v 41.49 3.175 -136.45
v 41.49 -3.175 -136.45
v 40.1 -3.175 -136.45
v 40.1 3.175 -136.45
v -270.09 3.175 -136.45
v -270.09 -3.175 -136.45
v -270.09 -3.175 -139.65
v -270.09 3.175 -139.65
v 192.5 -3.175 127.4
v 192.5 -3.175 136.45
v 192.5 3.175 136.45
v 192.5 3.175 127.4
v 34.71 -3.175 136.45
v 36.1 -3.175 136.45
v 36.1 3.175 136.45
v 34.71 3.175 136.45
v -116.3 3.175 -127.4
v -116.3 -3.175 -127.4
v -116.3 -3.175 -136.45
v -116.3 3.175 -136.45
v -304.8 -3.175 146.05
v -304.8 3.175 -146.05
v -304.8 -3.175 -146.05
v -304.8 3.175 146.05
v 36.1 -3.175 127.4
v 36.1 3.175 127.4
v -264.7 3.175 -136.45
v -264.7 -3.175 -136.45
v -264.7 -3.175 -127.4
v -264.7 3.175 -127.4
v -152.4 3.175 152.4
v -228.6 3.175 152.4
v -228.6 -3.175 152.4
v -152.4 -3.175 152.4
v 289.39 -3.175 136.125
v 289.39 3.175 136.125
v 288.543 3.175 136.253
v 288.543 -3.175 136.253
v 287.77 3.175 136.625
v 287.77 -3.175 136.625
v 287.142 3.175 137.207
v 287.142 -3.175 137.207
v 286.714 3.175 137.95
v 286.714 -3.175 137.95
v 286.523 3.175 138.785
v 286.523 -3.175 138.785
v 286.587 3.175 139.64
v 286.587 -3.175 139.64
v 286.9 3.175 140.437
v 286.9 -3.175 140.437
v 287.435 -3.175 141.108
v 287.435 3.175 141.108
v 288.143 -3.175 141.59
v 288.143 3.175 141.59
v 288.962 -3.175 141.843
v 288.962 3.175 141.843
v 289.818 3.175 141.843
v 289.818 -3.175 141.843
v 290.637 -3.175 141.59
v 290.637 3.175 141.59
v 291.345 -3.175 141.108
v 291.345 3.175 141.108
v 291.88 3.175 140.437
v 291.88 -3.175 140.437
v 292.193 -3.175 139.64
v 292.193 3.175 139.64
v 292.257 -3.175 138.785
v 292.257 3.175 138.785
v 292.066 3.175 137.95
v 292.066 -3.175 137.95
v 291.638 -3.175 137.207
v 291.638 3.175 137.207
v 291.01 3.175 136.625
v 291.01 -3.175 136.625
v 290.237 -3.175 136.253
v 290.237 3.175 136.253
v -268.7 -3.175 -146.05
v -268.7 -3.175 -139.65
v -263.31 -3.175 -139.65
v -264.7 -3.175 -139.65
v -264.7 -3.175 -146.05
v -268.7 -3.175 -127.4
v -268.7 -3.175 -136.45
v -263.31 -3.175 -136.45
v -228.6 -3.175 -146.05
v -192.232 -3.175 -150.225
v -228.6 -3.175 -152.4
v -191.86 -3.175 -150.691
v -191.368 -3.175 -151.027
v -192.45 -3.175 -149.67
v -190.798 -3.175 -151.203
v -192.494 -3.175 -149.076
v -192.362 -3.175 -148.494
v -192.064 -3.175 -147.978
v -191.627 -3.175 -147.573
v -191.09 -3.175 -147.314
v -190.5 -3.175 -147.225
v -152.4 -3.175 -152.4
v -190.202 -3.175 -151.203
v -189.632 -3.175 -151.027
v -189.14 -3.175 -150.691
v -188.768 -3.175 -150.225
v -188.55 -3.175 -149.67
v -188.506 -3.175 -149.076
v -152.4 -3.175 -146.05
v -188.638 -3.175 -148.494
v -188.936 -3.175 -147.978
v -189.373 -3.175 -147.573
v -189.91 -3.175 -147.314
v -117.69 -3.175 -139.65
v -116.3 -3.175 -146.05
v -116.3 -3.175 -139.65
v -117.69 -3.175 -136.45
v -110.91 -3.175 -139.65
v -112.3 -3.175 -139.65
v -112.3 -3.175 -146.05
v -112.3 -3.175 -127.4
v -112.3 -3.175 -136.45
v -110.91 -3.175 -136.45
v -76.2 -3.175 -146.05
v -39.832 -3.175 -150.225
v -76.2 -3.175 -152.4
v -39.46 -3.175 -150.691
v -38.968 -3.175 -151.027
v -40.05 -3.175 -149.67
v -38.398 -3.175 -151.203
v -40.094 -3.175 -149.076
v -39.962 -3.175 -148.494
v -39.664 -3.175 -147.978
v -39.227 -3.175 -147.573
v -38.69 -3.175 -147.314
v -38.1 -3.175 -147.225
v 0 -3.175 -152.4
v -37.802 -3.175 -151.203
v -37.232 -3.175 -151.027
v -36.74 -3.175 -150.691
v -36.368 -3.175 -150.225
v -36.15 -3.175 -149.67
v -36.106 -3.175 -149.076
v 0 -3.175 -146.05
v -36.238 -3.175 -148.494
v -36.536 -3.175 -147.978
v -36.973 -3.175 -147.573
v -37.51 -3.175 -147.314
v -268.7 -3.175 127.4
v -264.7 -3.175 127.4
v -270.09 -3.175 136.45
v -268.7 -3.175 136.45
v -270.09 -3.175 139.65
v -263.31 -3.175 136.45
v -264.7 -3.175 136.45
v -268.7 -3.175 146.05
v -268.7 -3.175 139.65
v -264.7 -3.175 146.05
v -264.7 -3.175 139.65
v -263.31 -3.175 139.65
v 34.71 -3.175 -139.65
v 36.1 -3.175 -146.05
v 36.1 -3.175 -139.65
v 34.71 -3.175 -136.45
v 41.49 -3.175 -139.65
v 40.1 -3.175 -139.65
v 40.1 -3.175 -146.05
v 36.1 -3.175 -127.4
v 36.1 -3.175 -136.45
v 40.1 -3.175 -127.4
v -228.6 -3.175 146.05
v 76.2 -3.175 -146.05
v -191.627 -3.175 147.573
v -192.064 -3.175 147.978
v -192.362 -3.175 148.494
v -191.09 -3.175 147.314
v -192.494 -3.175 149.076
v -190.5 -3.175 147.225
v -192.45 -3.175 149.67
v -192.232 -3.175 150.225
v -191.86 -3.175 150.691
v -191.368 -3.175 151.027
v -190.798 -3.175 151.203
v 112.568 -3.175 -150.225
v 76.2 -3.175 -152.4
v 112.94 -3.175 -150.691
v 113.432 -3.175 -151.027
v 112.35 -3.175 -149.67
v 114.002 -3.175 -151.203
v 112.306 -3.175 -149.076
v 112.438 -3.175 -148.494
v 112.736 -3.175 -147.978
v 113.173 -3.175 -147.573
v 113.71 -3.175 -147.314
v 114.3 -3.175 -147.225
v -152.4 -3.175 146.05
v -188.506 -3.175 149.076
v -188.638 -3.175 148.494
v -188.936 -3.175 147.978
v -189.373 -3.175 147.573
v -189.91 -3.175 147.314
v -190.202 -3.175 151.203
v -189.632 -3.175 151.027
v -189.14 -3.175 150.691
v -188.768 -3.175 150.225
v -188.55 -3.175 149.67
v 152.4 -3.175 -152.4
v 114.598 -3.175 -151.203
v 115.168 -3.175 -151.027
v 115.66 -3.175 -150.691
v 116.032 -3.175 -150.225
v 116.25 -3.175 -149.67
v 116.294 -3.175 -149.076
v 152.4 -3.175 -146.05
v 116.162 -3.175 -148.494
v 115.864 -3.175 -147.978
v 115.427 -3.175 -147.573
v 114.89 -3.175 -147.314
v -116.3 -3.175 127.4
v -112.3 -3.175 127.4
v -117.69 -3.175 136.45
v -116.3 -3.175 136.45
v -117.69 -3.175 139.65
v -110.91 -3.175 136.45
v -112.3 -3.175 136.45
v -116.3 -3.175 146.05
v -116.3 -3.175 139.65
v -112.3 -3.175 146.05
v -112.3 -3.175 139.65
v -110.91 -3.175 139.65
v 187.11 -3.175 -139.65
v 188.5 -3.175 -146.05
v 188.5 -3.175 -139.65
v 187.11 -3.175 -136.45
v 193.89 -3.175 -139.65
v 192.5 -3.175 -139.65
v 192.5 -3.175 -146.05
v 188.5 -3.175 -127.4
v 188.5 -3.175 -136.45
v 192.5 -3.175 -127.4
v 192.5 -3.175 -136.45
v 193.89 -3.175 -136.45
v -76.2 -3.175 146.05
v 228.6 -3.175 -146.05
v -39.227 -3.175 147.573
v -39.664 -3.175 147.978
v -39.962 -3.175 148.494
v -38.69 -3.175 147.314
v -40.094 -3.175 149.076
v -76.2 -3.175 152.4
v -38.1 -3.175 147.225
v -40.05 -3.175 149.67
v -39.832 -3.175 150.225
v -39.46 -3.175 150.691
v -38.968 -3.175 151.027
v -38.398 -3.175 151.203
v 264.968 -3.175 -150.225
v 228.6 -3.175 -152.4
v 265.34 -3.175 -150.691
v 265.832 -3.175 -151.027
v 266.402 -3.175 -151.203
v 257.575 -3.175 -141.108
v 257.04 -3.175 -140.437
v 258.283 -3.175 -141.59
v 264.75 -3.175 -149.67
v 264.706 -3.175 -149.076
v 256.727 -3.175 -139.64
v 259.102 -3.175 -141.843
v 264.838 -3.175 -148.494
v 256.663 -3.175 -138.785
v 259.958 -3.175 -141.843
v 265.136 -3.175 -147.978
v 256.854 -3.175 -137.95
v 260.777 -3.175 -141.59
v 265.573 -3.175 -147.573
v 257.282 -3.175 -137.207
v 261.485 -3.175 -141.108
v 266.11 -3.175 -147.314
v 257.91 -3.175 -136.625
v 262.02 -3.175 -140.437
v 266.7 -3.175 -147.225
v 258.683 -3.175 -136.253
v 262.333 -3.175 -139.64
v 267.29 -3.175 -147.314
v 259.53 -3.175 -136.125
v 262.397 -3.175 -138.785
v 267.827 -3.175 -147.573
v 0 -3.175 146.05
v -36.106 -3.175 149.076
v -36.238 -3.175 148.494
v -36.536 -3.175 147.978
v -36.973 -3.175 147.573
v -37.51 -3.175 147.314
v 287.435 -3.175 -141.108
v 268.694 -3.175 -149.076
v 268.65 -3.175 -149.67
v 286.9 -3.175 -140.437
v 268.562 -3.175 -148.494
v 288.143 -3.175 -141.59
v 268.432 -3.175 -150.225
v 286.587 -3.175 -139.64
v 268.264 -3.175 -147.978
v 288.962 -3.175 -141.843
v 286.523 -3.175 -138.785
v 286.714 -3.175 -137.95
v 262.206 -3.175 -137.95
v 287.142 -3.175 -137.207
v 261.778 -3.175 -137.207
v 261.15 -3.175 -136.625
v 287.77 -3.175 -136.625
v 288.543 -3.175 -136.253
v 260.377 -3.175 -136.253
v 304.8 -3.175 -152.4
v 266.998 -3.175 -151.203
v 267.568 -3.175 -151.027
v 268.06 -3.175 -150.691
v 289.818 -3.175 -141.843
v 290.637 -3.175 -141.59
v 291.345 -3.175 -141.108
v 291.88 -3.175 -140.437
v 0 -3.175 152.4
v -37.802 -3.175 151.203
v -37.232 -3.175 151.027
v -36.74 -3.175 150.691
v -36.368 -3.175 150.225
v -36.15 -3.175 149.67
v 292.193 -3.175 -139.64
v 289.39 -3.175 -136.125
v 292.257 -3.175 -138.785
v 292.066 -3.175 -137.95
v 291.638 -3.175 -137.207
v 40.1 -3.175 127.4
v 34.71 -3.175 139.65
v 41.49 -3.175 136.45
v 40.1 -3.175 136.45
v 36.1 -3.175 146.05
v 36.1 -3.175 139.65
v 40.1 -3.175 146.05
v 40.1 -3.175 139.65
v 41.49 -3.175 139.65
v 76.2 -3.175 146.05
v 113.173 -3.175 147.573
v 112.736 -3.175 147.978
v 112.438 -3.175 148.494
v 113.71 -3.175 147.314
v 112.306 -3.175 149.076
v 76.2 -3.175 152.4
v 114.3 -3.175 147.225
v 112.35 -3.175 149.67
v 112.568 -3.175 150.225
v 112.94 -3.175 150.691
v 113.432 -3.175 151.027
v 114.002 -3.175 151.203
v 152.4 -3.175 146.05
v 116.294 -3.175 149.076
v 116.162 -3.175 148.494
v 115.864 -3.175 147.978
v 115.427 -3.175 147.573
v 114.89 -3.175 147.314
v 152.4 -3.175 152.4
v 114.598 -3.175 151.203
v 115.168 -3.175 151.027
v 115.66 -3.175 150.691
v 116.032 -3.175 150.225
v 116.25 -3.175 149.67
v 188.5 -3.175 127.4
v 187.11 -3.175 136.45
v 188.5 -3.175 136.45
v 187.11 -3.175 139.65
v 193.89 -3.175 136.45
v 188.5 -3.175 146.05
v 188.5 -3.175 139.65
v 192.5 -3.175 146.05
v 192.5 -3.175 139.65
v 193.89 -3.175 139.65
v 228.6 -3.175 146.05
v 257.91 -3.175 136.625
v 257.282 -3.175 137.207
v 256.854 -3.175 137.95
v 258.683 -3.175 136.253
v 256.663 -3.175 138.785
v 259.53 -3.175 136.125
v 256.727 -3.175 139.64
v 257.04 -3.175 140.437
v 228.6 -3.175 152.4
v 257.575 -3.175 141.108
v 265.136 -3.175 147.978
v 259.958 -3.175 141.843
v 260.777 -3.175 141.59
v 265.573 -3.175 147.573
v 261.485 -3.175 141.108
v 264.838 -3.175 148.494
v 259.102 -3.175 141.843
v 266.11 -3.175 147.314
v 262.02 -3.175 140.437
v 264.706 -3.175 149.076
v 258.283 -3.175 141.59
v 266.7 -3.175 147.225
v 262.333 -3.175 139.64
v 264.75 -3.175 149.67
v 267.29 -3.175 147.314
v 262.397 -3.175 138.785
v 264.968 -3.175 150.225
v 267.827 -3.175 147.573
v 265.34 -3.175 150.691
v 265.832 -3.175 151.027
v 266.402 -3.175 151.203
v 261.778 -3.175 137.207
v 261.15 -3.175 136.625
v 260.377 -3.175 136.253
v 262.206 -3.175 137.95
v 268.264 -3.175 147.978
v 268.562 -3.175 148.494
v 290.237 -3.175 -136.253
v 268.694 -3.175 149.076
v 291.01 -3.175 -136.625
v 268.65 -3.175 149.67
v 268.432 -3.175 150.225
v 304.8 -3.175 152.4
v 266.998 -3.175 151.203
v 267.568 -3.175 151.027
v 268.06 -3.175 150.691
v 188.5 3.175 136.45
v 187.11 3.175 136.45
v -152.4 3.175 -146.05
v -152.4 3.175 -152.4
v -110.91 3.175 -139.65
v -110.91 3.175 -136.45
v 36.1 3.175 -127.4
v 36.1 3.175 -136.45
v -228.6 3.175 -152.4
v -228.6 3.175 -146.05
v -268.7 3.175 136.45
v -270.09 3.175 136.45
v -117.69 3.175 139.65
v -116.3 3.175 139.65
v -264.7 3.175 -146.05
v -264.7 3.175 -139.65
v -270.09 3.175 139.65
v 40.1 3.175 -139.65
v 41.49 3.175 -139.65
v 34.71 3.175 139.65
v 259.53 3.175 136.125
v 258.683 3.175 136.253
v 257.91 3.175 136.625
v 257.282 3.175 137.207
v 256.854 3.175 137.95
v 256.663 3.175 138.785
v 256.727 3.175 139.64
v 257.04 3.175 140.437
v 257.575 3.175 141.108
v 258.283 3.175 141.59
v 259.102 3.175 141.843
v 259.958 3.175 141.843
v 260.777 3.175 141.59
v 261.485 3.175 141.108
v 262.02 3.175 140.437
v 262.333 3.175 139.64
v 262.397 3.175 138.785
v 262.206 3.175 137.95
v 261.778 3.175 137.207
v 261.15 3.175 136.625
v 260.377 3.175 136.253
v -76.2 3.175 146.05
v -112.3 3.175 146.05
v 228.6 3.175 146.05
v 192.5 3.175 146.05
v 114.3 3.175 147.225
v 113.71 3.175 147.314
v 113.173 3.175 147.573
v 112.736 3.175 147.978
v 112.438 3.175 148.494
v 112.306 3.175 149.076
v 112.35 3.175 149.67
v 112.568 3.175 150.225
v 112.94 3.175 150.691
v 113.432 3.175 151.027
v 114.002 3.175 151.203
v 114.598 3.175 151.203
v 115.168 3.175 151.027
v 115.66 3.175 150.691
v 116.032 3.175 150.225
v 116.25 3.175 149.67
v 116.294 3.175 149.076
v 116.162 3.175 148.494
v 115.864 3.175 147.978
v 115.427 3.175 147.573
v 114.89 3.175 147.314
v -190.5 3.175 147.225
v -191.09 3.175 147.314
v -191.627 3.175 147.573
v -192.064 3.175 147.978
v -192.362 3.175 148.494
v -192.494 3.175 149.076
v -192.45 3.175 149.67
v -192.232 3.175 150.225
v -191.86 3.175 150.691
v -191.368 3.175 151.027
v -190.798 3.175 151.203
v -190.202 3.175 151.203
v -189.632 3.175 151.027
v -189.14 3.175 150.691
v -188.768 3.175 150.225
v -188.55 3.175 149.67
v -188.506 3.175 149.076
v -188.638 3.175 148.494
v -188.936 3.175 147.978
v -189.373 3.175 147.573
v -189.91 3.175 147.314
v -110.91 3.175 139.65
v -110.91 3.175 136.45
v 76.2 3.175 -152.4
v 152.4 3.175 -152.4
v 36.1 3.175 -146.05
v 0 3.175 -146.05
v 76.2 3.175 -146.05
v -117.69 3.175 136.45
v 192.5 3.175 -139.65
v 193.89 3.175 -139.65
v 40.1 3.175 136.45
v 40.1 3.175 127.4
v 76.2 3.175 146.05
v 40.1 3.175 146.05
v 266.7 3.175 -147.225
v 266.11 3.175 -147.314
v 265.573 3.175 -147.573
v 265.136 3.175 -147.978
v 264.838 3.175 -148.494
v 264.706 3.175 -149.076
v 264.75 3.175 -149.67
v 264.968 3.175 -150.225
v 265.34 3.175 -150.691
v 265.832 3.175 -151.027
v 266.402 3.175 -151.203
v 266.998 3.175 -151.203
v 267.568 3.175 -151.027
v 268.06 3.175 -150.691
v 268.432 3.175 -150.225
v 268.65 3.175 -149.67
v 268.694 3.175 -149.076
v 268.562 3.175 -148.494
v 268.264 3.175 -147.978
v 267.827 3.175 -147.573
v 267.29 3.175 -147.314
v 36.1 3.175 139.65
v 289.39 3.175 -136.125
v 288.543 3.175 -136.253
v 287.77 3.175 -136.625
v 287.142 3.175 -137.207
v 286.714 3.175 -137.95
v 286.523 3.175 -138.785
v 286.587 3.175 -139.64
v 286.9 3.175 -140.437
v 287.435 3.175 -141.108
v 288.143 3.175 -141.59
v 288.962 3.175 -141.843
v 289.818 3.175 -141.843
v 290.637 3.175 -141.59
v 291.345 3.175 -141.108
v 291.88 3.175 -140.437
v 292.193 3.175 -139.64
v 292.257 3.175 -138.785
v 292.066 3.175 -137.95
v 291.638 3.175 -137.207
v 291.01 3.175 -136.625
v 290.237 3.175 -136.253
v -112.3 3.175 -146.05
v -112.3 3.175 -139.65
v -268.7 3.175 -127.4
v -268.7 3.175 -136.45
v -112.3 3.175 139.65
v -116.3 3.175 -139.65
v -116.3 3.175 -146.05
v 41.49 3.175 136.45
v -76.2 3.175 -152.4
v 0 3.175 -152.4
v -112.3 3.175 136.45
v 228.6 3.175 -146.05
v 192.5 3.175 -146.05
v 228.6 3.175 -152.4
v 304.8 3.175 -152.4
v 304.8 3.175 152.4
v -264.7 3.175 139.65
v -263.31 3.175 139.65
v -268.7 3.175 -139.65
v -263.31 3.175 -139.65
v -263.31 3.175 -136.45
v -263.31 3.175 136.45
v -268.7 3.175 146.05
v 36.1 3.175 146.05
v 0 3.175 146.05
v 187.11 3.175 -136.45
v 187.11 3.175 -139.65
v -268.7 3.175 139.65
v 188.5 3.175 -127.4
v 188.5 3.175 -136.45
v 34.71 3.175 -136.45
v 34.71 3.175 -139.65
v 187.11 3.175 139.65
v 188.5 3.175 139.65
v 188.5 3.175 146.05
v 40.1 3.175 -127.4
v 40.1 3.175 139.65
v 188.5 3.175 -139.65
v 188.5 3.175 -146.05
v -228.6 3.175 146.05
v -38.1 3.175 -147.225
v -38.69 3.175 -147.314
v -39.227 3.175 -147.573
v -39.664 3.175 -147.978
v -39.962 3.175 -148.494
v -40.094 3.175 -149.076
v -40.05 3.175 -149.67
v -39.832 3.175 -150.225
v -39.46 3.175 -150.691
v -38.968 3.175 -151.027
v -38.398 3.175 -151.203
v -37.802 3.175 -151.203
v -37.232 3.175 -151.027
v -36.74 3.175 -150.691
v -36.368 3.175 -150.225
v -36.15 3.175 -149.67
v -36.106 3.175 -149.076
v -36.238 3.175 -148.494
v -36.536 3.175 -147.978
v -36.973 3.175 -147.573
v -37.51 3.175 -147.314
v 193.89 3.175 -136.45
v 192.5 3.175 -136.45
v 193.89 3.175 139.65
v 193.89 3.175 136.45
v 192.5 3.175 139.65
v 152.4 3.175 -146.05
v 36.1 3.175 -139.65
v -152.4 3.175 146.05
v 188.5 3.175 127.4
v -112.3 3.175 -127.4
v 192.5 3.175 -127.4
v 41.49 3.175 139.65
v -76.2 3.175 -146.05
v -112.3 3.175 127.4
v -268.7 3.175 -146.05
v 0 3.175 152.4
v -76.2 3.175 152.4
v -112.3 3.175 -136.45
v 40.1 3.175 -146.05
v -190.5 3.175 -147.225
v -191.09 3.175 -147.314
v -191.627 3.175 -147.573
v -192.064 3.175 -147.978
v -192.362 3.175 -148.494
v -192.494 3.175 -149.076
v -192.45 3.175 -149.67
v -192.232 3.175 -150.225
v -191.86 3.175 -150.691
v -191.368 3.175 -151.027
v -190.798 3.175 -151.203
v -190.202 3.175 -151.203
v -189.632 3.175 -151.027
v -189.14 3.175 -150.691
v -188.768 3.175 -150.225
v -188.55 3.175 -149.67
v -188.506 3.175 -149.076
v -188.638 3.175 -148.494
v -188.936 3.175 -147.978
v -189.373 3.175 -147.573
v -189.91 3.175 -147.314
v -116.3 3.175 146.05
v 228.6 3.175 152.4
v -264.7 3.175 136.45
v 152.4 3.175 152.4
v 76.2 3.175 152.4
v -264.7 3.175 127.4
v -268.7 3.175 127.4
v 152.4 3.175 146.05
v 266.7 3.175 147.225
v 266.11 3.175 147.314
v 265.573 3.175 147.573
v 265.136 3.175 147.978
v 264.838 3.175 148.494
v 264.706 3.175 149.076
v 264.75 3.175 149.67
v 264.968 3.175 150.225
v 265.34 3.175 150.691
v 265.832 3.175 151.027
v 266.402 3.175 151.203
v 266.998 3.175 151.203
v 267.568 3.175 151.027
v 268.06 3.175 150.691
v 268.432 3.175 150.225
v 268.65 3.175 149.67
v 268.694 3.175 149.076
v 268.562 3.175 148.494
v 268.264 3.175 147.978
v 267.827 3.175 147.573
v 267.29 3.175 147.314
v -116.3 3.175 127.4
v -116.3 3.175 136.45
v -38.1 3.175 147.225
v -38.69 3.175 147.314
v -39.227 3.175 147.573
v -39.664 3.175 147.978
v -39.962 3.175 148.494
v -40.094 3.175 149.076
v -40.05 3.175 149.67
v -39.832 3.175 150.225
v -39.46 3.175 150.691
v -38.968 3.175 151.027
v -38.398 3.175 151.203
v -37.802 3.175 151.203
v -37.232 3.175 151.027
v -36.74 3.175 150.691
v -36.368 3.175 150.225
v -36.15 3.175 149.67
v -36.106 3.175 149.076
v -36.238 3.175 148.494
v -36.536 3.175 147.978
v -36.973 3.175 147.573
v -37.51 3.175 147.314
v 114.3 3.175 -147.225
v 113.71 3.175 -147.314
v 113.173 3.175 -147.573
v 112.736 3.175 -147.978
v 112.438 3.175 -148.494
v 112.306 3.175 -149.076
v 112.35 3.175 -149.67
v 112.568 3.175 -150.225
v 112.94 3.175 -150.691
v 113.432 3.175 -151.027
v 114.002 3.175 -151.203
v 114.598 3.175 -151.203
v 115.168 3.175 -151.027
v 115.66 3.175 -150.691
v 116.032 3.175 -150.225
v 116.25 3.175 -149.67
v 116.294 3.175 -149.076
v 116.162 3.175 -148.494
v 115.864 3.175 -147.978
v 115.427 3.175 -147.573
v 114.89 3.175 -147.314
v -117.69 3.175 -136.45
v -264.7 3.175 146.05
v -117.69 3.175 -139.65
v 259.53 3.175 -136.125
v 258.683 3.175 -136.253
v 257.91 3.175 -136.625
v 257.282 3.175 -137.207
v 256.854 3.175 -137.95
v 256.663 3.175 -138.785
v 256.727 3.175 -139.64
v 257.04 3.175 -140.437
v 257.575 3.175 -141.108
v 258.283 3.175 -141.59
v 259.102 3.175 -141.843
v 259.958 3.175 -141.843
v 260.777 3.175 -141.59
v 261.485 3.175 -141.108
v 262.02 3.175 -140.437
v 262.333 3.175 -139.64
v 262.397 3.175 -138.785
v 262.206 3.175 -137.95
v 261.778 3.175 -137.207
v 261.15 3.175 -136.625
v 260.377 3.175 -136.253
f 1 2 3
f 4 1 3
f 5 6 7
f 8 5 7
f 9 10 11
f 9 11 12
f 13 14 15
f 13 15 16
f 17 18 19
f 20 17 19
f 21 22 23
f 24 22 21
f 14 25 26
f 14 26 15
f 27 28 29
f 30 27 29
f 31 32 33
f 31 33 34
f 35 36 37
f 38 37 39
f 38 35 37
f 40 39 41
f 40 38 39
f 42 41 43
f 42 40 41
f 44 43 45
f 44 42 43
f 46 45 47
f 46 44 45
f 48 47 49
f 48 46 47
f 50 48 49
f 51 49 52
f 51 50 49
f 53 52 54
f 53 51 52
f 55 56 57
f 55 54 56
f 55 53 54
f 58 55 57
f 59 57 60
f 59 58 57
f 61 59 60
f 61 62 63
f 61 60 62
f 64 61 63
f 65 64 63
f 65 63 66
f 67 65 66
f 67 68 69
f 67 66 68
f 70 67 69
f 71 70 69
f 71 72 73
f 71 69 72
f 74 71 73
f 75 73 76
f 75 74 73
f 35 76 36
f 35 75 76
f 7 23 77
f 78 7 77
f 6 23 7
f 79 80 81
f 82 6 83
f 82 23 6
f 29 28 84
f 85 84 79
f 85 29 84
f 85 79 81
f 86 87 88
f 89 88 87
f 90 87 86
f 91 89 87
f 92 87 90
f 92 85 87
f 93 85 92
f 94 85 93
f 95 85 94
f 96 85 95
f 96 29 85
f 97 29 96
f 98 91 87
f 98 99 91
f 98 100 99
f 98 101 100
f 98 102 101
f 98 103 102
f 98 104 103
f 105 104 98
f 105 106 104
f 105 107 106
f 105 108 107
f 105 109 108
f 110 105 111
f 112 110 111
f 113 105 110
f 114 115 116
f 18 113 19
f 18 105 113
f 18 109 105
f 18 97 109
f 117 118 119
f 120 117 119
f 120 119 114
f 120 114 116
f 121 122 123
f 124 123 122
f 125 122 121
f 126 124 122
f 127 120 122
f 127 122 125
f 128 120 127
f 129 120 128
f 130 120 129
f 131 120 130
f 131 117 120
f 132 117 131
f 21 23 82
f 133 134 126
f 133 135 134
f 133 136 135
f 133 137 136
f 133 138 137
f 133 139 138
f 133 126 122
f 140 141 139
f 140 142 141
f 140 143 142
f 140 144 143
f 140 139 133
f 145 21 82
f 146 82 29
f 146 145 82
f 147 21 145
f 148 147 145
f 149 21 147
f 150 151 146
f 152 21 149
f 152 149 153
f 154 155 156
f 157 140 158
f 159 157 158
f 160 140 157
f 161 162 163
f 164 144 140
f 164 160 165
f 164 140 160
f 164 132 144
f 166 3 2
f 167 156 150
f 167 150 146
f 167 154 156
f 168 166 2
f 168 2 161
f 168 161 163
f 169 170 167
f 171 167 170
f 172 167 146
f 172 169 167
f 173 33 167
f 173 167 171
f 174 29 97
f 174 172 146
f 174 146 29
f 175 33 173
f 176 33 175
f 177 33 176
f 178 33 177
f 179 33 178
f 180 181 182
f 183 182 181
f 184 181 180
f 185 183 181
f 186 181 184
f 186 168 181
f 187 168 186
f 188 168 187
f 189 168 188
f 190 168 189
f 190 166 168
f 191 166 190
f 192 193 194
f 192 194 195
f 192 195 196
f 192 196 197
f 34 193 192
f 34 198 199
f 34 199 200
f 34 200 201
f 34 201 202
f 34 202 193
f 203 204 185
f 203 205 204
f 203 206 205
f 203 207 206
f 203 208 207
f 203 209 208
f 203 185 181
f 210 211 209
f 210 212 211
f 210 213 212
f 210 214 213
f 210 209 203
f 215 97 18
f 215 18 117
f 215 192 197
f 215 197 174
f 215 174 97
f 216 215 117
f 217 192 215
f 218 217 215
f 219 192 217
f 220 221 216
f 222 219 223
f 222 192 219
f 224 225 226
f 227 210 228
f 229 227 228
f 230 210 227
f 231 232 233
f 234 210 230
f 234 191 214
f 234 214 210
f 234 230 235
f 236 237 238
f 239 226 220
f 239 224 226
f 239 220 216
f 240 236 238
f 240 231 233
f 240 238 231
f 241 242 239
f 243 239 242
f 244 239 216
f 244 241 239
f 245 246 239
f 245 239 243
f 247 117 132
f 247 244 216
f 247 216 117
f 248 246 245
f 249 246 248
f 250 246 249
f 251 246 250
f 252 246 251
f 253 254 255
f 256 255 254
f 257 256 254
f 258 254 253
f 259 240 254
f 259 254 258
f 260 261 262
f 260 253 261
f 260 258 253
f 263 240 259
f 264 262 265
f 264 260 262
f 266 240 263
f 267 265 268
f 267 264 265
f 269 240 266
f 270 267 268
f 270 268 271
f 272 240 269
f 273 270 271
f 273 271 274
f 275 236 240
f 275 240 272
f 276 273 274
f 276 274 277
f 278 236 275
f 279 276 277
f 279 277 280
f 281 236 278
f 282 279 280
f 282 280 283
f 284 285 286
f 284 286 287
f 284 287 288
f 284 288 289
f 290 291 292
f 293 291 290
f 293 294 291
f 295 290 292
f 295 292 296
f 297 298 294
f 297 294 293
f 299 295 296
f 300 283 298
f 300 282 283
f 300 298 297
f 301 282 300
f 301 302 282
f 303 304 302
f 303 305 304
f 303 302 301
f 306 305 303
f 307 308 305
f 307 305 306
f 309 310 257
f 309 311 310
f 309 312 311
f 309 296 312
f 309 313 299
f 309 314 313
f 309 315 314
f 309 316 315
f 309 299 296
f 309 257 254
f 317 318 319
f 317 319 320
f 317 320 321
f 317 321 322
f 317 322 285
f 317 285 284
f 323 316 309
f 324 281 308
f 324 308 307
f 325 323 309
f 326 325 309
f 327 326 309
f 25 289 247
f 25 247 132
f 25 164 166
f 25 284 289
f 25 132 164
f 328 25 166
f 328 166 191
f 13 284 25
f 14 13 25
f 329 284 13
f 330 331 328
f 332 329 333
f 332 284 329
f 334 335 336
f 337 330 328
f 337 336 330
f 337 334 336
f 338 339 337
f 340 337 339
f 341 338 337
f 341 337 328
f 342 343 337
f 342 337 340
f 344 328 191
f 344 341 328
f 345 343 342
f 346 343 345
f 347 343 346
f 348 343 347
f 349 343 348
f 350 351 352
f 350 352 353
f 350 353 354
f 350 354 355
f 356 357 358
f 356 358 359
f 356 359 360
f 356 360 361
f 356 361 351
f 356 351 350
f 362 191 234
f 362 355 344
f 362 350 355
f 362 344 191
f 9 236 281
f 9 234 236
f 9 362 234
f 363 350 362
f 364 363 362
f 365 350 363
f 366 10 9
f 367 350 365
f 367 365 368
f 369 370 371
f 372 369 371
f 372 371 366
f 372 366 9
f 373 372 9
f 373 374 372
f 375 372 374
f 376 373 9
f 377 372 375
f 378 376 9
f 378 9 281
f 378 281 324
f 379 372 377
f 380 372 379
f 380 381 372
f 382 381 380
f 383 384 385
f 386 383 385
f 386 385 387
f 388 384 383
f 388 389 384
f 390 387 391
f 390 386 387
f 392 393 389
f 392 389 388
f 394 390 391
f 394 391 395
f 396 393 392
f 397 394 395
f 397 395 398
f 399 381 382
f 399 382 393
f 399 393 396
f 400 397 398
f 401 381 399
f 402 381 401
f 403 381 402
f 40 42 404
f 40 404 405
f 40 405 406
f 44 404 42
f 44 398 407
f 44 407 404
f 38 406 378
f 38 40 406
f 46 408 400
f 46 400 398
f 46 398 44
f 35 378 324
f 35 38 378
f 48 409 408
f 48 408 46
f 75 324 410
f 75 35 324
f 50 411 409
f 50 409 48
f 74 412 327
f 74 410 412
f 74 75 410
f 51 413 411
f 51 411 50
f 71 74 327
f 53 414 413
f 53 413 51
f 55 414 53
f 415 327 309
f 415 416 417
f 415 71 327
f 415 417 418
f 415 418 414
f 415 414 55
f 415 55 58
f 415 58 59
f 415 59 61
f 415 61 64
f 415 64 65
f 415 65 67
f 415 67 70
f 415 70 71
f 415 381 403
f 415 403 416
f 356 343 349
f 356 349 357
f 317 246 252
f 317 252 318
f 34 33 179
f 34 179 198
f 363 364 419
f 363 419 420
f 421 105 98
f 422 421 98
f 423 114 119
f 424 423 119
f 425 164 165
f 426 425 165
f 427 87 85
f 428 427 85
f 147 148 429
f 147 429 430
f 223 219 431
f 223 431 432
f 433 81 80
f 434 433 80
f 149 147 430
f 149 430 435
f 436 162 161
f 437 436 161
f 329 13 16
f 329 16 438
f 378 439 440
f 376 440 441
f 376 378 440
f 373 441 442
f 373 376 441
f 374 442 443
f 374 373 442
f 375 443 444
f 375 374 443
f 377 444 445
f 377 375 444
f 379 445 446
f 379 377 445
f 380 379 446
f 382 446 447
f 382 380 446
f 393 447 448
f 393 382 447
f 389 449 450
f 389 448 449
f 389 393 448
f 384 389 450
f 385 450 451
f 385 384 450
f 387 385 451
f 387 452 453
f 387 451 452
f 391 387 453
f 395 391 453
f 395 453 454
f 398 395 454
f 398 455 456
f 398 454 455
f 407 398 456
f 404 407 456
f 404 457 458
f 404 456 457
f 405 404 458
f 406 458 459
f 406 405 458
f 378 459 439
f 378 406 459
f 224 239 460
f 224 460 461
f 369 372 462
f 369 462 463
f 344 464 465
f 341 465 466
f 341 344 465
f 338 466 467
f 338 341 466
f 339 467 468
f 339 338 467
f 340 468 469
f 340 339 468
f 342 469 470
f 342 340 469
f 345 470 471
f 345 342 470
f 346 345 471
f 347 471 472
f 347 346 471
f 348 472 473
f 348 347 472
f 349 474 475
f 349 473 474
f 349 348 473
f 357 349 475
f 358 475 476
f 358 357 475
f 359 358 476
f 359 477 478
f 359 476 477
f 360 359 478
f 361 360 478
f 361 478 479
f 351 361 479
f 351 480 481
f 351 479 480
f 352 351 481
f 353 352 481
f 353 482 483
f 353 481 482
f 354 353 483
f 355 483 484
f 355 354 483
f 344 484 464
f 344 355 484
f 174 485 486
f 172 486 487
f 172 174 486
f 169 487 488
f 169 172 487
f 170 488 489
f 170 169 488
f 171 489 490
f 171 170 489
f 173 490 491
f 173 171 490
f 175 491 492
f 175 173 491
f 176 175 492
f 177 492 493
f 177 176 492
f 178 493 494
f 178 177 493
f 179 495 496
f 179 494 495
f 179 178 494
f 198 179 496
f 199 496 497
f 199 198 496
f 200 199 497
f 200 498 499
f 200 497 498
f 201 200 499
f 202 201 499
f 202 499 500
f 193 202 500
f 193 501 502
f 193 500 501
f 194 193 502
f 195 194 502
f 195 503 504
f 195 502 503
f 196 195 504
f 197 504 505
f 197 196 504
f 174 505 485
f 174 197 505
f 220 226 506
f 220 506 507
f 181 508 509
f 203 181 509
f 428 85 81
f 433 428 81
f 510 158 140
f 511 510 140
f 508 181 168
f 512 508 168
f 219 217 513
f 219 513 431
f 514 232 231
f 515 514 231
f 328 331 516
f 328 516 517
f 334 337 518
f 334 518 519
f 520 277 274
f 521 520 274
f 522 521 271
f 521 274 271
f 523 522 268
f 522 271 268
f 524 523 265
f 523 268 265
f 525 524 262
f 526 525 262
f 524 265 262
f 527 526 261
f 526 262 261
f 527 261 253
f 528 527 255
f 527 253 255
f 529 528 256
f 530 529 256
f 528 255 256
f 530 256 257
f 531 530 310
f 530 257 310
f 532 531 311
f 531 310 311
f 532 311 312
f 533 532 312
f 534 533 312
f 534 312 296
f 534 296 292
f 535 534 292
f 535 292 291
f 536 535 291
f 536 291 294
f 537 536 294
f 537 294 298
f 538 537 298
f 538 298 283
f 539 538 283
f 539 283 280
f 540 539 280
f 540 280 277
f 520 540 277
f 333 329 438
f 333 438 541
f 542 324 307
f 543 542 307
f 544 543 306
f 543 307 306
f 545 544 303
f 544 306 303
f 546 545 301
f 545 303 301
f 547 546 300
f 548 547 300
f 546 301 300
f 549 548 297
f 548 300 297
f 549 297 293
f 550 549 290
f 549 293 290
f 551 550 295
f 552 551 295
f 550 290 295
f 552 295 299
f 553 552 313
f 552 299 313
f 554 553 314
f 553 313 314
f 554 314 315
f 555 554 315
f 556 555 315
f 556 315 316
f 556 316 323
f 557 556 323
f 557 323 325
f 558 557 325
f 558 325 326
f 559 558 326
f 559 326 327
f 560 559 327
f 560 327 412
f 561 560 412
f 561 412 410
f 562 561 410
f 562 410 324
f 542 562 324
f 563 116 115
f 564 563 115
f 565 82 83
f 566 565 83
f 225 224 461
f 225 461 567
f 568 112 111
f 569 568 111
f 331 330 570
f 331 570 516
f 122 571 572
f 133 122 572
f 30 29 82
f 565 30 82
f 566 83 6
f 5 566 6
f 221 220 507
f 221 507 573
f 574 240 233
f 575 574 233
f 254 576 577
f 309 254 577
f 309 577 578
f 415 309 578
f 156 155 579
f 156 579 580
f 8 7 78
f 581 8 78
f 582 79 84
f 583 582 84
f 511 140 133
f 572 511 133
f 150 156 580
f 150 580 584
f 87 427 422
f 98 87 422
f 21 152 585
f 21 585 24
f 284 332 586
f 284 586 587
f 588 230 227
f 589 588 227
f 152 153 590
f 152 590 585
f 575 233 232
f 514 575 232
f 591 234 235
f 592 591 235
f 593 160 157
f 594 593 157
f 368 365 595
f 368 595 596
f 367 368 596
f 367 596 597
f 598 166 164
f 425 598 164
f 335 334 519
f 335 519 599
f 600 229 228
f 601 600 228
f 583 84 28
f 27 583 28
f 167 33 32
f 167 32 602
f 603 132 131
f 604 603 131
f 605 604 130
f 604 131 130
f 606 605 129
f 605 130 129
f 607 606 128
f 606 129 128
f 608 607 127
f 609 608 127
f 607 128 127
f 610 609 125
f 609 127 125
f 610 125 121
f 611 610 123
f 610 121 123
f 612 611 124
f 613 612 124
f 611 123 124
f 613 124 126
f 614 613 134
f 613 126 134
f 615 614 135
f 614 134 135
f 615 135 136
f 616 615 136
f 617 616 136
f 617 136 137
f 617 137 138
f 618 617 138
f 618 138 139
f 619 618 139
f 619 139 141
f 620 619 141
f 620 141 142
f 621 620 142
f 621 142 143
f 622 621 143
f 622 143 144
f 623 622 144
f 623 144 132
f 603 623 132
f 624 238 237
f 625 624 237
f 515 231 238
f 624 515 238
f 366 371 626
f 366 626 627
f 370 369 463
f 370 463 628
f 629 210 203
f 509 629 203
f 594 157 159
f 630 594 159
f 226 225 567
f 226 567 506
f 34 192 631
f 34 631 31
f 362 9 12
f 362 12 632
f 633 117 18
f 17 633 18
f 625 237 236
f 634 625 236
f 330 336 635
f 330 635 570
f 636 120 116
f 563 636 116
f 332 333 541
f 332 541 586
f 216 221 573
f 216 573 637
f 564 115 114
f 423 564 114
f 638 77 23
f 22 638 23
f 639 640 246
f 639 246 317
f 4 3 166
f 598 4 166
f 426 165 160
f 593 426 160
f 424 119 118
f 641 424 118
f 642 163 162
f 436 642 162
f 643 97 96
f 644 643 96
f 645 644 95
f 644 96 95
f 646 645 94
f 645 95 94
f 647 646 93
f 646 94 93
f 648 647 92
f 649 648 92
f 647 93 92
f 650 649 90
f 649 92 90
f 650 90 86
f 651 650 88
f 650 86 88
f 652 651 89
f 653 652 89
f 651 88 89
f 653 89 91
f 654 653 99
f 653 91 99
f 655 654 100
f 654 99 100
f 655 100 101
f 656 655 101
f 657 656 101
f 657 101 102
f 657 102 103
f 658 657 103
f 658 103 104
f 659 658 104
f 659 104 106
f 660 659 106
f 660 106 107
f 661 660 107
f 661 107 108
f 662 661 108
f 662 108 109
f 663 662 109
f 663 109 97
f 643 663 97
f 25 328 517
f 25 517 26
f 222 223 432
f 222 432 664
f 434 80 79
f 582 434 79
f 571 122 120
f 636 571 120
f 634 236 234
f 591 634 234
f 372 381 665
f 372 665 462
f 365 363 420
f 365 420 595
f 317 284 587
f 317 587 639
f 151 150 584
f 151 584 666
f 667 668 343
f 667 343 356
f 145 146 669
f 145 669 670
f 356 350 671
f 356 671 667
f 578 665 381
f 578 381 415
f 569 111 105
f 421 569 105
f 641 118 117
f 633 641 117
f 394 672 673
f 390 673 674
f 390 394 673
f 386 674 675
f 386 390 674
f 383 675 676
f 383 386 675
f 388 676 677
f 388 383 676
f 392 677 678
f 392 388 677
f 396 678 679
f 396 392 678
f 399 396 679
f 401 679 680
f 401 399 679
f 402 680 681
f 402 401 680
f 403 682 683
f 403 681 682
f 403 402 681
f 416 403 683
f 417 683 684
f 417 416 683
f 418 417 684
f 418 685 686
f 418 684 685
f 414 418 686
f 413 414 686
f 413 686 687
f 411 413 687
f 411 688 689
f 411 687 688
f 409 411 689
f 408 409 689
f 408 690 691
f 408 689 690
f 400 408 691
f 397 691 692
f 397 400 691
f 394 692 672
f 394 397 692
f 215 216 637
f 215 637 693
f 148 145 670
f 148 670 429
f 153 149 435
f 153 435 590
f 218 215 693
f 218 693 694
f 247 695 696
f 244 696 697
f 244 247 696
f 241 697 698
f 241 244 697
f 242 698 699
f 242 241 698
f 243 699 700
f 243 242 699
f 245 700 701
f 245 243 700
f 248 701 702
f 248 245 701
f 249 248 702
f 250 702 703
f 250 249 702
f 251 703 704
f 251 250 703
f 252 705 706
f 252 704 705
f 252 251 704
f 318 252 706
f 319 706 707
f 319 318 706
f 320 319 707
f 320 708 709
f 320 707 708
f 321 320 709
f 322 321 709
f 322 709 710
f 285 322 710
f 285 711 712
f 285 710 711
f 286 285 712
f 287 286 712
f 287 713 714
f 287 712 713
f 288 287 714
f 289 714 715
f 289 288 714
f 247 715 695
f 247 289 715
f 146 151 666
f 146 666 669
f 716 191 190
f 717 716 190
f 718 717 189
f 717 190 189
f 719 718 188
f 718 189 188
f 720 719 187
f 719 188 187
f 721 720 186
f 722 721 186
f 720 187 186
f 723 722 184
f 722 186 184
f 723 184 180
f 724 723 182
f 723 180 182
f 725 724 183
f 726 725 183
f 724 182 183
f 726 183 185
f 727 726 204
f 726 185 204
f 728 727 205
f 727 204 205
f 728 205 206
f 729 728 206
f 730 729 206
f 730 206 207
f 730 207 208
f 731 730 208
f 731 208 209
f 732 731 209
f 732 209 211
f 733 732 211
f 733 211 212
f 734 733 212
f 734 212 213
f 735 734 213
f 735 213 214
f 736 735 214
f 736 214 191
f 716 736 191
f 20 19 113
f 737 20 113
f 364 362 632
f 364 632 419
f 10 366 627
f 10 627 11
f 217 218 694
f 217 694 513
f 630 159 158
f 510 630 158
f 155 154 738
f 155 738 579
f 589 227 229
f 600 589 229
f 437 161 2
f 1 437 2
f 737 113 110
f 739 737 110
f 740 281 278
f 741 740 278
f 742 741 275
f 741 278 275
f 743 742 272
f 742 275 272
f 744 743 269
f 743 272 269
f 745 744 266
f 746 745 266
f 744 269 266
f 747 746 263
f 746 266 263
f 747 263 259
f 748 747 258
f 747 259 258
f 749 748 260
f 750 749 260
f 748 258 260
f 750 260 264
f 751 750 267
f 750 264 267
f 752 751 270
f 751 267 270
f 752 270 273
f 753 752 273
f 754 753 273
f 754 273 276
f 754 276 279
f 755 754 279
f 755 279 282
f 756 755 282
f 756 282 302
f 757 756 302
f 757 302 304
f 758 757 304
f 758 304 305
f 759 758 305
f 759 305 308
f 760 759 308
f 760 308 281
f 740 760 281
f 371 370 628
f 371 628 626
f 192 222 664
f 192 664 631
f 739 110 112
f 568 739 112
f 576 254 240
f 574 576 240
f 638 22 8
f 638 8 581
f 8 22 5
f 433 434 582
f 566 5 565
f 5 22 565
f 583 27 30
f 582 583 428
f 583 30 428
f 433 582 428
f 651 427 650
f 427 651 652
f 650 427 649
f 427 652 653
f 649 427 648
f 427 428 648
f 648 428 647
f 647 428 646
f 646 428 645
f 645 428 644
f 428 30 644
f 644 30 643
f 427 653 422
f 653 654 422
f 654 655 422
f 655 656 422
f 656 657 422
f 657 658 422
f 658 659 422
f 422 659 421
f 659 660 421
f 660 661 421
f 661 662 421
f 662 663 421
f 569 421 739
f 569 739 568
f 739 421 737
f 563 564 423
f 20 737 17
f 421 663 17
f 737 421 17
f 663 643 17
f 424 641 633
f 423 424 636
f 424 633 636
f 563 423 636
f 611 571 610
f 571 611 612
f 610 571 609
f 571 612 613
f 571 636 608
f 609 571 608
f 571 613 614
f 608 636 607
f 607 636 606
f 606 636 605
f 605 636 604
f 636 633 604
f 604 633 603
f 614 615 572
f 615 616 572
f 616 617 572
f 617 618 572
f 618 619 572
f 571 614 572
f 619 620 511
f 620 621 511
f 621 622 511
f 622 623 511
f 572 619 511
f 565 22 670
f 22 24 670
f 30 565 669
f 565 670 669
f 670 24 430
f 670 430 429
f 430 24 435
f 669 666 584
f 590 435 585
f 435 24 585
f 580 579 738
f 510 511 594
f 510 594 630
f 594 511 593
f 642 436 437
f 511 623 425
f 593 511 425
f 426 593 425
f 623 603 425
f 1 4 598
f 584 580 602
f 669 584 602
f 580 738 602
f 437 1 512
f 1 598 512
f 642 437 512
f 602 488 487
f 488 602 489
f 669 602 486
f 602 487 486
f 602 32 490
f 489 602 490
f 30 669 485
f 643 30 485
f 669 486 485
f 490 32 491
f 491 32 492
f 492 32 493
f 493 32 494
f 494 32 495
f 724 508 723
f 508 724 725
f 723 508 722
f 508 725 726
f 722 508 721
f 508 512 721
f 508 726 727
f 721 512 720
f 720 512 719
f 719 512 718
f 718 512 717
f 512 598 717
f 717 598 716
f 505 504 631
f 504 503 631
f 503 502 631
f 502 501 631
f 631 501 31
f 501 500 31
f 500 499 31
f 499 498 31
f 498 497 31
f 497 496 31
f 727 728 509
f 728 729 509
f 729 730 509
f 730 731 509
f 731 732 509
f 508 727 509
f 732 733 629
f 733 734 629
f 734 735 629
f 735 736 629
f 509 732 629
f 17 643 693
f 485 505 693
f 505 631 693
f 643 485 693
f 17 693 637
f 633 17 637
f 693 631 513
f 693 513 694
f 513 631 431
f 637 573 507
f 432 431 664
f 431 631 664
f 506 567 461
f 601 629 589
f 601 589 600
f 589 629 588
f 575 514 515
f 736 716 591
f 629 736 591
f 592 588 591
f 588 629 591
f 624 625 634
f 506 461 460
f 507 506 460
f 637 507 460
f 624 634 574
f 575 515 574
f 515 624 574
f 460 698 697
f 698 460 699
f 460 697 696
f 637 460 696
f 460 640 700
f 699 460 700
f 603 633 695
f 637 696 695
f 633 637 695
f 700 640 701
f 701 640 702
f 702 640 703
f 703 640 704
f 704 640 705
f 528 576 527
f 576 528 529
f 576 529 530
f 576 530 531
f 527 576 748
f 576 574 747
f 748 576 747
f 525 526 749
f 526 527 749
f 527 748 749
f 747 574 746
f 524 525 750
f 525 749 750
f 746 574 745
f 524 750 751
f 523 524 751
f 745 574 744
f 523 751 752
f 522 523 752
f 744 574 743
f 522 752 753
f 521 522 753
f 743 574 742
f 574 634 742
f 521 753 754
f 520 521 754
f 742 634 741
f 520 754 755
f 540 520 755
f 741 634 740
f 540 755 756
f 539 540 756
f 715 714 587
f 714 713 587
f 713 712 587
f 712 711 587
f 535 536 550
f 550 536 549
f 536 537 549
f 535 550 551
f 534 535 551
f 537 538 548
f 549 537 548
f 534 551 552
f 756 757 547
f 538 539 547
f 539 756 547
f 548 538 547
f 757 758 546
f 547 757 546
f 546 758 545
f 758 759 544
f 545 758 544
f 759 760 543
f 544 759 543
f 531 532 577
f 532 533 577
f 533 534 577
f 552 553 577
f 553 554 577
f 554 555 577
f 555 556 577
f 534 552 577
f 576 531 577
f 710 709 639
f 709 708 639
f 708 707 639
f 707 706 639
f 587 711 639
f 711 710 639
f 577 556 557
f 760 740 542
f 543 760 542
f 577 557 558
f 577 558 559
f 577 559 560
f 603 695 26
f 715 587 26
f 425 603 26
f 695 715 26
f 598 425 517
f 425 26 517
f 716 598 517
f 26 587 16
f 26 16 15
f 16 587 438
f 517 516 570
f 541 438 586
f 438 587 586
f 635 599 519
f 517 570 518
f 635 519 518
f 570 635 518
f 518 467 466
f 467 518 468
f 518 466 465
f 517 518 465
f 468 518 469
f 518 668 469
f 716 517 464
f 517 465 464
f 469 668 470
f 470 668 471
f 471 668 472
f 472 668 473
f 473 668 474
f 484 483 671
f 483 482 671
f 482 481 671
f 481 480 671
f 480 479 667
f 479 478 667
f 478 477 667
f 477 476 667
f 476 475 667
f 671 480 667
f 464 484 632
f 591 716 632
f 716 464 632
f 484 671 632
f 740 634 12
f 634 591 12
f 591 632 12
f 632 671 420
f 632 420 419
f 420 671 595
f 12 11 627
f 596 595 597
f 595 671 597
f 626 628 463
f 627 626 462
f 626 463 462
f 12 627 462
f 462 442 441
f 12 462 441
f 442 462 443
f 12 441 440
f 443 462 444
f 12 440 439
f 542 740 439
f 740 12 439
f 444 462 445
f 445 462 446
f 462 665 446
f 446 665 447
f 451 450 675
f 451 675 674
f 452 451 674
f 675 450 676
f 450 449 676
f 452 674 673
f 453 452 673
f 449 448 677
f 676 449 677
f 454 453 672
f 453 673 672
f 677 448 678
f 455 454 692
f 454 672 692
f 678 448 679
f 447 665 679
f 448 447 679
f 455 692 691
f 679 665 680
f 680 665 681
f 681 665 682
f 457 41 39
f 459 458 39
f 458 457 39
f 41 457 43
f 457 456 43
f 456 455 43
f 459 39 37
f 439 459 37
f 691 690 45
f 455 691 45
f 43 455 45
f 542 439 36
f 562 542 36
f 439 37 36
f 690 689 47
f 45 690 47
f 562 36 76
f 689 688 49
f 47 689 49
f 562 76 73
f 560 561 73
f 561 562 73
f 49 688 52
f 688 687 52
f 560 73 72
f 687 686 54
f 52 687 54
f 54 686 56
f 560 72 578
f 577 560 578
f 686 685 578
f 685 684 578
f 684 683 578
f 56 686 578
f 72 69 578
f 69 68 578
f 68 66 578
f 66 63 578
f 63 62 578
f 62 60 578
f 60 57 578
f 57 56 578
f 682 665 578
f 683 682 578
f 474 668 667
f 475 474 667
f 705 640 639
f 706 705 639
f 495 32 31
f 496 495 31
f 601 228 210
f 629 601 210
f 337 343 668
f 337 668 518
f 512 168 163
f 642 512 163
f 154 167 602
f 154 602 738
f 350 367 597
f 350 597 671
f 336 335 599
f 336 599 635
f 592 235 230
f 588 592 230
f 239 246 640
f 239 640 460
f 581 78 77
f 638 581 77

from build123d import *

# Parameters (mm, degrees)
SKETCH1_W           = 609.6
SKETCH1_H           = 152.4
BOSS_EXTRUDE1_DEPTH = 3.175
SKETCH2_R           = 2.875
SKETCH2_R_2         = 2
CUT_EXTRUDE1_DEPTH  = 341.835917268


with BuildPart() as part:
    # Sketch1 → Boss-Extrude1 (new, symmetric)
    with BuildSketch(Plane(origin=(0, 0, 0), x_dir=(1, 0, 0), z_dir=(0, 1, 0))):
        with Locations((0, -76.2)):
            Rectangle(SKETCH1_W, SKETCH1_H)
    boss_extrude1 = extrude(amount=BOSS_EXTRUDE1_DEPTH, both=True)

    # Sketch2 → Cut-Extrude1 (cut, through all)
    with BuildSketch(Plane(origin=(0, -3.175, 0), x_dir=(1, 0, 0), z_dir=(0, 1, 0))):
        Polygon((34.71, -136.45), (34.71, -139.65), (36.1, -139.65), (36.1, -146.05), (0, -146.05), (0, -152.4), (76.2, -152.4), (76.2, -146.05), (40.1, -146.05), (40.1, -139.65), (41.49, -139.65), (41.49, -136.45), (40.1, -136.45), (40.1, -127.4), (36.1, -127.4), (36.1, -136.45), align=None)
        Polygon((-304.8, -146.05), (-304.8, -152.4), (-228.6, -152.4), (-228.6, -146.05), (-264.7, -146.05), (-264.7, -139.65), (-263.31, -139.65), (-263.31, -136.45), (-264.7, -136.45), (-264.7, -127.4), (-268.7, -127.4), (-268.7, -136.45), (-270.09, -136.45), (-270.09, -139.65), (-268.7, -139.65), (-268.7, -146.05), align=None)
        Polygon((-152.4, -146.05), (-152.4, -152.4), (-76.2, -152.4), (-76.2, -146.05), (-112.3, -146.05), (-112.3, -139.65), (-110.91, -139.65), (-110.91, -136.45), (-112.3, -136.45), (-112.3, -127.4), (-116.3, -127.4), (-116.3, -136.45), (-117.69, -136.45), (-117.69, -139.65), (-116.3, -139.65), (-116.3, -146.05), align=None)
        Polygon((152.4, -146.05), (152.4, -152.4), (228.6, -152.4), (228.6, -146.05), (192.5, -146.05), (192.5, -139.65), (193.89, -139.65), (193.89, -136.45), (192.5, -136.45), (192.5, -127.4), (188.5, -127.4), (188.5, -136.45), (187.11, -136.45), (187.11, -139.65), (188.5, -139.65), (188.5, -146.05), align=None)
        with Locations(Location((289.39, -138.999999876, 0), (0, 0, 90))):
            Circle(SKETCH2_R)
        with Locations(Location((259.53, -138.999999876, 0), (0, 0, 90))):
            Circle(SKETCH2_R)
        with Locations(Location((266.7, -149.225, 0), (0, 0, 90))):
            Circle(SKETCH2_R_2)
        with Locations(Location((114.3, -149.225, 0), (0, 0, 90))):
            Circle(SKETCH2_R_2)
        with Locations(Location((-38.1, -149.225, 0), (0, 0, 90))):
            Circle(SKETCH2_R_2)
        with Locations(Location((-190.5, -149.225, 0), (0, 0, 90))):
            Circle(SKETCH2_R_2)
    cut_extrude1 = extrude(amount=CUT_EXTRUDE1_DEPTH, mode=Mode.SUBTRACT)

    # Mirror1: Boss-Extrude1, Cut-Extrude1 across plane
    add(boss_extrude1.mirror(Plane(origin=(0, 3.175, 0), x_dir=(1, 0, 0), z_dir=(0, 0, 1))))
    add(cut_extrude1.mirror(Plane(origin=(0, 3.175, 0), x_dir=(1, 0, 0), z_dir=(0, 0, 1))), mode=Mode.SUBTRACT)


solid = part.part
